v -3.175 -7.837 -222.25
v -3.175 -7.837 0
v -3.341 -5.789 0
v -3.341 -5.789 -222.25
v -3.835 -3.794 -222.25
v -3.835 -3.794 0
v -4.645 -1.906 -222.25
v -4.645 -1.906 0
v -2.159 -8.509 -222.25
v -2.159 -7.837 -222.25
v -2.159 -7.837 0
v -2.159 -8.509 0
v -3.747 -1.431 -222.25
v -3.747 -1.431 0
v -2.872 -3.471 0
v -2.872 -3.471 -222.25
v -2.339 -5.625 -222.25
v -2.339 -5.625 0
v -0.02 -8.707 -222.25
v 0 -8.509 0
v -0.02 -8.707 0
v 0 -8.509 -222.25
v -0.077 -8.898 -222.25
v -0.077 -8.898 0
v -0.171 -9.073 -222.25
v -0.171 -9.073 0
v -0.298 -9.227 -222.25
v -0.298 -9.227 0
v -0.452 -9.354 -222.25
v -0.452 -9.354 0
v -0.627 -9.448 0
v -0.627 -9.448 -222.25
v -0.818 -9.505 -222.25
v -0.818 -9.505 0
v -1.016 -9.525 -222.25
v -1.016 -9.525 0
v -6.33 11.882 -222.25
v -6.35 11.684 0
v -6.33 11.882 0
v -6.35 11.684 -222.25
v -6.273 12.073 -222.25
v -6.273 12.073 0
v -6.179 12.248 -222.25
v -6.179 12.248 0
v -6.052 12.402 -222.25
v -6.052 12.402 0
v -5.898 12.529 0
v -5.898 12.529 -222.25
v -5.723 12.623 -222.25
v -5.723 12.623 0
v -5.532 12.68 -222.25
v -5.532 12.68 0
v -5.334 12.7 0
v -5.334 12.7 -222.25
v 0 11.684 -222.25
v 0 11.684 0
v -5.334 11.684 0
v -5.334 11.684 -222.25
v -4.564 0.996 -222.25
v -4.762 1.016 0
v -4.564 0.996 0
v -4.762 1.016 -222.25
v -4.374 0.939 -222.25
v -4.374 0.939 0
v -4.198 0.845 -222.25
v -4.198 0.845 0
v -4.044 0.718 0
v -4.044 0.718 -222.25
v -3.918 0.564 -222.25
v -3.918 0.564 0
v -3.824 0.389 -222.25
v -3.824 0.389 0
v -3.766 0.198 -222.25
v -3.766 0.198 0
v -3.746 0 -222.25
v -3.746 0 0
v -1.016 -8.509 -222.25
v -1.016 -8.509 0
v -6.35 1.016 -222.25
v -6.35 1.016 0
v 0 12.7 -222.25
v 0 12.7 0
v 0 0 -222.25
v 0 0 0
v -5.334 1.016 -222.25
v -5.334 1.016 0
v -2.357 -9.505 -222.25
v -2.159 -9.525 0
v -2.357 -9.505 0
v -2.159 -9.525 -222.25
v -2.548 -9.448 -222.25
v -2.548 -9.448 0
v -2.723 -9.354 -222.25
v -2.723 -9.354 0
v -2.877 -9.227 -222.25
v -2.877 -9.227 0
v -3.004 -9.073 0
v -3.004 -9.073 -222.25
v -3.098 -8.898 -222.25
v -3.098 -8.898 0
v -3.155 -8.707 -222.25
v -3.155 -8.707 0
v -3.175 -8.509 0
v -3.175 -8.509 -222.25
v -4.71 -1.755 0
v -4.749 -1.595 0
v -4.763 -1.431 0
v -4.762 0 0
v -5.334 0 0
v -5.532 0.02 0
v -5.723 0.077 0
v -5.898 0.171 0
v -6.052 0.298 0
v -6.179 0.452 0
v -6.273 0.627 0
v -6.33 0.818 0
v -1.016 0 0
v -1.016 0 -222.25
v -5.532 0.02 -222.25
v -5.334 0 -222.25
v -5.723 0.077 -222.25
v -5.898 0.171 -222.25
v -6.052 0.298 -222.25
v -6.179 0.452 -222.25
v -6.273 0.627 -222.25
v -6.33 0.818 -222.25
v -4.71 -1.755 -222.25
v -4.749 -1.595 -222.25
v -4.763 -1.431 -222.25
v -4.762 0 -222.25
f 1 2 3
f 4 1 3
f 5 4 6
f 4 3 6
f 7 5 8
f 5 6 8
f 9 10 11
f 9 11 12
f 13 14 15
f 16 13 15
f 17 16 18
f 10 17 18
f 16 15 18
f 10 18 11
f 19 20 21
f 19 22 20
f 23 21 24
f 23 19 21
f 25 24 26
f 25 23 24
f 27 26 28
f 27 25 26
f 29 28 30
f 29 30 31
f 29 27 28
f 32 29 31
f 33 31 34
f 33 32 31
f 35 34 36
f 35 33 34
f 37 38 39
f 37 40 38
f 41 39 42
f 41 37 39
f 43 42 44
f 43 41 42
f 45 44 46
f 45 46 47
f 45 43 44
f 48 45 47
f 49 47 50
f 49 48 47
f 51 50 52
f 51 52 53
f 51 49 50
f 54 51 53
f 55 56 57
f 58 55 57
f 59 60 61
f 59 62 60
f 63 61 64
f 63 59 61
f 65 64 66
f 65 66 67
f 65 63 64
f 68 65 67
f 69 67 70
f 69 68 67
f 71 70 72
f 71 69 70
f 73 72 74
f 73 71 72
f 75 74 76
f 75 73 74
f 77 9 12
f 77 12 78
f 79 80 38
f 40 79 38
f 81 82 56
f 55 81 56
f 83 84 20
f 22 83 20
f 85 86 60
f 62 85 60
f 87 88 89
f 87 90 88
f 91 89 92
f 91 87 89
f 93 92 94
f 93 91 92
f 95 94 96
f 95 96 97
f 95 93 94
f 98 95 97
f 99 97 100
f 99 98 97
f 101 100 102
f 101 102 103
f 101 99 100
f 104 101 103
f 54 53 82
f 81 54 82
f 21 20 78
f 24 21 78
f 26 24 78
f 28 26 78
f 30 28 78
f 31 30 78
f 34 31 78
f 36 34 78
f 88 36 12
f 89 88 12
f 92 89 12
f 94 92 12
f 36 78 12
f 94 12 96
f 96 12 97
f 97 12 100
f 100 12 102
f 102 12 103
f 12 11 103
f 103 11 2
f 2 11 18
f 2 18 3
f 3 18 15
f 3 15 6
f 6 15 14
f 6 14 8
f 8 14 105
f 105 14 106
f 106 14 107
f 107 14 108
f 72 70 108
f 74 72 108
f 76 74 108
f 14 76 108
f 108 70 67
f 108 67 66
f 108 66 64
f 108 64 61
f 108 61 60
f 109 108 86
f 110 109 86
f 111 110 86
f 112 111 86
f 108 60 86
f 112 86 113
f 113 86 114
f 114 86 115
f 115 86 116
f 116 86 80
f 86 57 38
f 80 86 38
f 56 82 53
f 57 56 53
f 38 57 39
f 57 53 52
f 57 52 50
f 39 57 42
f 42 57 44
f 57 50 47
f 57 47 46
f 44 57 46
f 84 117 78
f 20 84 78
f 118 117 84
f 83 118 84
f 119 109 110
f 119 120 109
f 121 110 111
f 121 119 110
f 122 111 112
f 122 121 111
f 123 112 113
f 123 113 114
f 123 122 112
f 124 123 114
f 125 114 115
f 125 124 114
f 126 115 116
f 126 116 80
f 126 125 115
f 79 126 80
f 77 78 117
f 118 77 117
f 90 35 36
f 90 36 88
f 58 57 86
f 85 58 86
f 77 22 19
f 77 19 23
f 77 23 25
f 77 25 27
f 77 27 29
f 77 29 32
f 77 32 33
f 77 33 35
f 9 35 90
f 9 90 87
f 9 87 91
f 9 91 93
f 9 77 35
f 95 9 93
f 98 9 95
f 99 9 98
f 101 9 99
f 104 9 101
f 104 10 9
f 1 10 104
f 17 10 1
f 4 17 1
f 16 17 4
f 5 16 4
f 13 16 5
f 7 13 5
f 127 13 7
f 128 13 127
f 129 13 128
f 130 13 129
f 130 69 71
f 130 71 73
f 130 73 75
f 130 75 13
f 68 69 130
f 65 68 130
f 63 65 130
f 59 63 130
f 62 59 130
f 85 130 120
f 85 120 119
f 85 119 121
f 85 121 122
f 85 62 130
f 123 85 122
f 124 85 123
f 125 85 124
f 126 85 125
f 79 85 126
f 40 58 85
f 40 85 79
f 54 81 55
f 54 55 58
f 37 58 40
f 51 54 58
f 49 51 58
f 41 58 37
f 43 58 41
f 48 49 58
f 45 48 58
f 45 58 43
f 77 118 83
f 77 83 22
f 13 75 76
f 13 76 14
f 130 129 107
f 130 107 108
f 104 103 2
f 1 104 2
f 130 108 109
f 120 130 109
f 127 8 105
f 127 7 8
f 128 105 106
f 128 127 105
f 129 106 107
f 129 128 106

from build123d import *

# Parameters (mm, degrees)
EXTRUDE_THIN1_DEPTH = 222.25
FILLET1_R           = 1.016


with BuildPart() as part:
    # Sketch1 → Extrude-Thin1 (new body)
    with BuildSketch(Plane.XY):
        with BuildLine():
            Line((0, 0), (0, -9.525))
            Line((0, -9.525), (-3.175, -9.525))
            Line((-3.175, -9.525), (-3.175, -7.836680531))
            ThreePointArc((-3.175, -7.836680531), (-3.578277876, -4.661680531), (-4.7625, -1.688319469))
            Line((-4.7625, -1.688319469), (-4.7625, 0))
            Line((-4.7625, 0), (-6.35, 0))
            Line((-6.35, 0), (-6.35, 12.7))
            Line((-6.35, 12.7), (0, 12.7))
            Line((0, 12.7), (0, 11.684))
            Line((0, 11.684), (-5.334, 11.684))
            Line((-5.334, 11.684), (-5.334, 1.016))
            Line((-5.334, 1.016), (-3.7465, 1.016))
            Line((-3.7465, 1.016), (-3.7465, -1.431359013))
            ThreePointArc((-3.7465, -1.431359013), (-2.56178923, -4.537123743), (-2.159, -7.836680531))
            Line((-2.159, -7.836680531), (-2.159, -8.509))
            Line((-2.159, -8.509), (-1.016, -8.509))
            Line((-1.016, -8.509), (-1.016, 0))
            Line((-1.016, 0), (0, 0))
        make_face()
    extrude(amount=-EXTRUDE_THIN1_DEPTH)

    # Fillet1
    fillet1_edges = [part.edges().sort_by_distance(p)[0] for p in [
        (-3.7465, 1.016, -111.125),
        (0, -9.525, -111.125),
        (-3.175, -9.525, -111.125),
        (-4.7625, -1.688319469, -111.125),
        (-6.35, 0, -111.125),
        (-6.35, 12.7, -111.125),
    ]]
    fillet(fillet1_edges, radius=FILLET1_R)


solid = part.part
